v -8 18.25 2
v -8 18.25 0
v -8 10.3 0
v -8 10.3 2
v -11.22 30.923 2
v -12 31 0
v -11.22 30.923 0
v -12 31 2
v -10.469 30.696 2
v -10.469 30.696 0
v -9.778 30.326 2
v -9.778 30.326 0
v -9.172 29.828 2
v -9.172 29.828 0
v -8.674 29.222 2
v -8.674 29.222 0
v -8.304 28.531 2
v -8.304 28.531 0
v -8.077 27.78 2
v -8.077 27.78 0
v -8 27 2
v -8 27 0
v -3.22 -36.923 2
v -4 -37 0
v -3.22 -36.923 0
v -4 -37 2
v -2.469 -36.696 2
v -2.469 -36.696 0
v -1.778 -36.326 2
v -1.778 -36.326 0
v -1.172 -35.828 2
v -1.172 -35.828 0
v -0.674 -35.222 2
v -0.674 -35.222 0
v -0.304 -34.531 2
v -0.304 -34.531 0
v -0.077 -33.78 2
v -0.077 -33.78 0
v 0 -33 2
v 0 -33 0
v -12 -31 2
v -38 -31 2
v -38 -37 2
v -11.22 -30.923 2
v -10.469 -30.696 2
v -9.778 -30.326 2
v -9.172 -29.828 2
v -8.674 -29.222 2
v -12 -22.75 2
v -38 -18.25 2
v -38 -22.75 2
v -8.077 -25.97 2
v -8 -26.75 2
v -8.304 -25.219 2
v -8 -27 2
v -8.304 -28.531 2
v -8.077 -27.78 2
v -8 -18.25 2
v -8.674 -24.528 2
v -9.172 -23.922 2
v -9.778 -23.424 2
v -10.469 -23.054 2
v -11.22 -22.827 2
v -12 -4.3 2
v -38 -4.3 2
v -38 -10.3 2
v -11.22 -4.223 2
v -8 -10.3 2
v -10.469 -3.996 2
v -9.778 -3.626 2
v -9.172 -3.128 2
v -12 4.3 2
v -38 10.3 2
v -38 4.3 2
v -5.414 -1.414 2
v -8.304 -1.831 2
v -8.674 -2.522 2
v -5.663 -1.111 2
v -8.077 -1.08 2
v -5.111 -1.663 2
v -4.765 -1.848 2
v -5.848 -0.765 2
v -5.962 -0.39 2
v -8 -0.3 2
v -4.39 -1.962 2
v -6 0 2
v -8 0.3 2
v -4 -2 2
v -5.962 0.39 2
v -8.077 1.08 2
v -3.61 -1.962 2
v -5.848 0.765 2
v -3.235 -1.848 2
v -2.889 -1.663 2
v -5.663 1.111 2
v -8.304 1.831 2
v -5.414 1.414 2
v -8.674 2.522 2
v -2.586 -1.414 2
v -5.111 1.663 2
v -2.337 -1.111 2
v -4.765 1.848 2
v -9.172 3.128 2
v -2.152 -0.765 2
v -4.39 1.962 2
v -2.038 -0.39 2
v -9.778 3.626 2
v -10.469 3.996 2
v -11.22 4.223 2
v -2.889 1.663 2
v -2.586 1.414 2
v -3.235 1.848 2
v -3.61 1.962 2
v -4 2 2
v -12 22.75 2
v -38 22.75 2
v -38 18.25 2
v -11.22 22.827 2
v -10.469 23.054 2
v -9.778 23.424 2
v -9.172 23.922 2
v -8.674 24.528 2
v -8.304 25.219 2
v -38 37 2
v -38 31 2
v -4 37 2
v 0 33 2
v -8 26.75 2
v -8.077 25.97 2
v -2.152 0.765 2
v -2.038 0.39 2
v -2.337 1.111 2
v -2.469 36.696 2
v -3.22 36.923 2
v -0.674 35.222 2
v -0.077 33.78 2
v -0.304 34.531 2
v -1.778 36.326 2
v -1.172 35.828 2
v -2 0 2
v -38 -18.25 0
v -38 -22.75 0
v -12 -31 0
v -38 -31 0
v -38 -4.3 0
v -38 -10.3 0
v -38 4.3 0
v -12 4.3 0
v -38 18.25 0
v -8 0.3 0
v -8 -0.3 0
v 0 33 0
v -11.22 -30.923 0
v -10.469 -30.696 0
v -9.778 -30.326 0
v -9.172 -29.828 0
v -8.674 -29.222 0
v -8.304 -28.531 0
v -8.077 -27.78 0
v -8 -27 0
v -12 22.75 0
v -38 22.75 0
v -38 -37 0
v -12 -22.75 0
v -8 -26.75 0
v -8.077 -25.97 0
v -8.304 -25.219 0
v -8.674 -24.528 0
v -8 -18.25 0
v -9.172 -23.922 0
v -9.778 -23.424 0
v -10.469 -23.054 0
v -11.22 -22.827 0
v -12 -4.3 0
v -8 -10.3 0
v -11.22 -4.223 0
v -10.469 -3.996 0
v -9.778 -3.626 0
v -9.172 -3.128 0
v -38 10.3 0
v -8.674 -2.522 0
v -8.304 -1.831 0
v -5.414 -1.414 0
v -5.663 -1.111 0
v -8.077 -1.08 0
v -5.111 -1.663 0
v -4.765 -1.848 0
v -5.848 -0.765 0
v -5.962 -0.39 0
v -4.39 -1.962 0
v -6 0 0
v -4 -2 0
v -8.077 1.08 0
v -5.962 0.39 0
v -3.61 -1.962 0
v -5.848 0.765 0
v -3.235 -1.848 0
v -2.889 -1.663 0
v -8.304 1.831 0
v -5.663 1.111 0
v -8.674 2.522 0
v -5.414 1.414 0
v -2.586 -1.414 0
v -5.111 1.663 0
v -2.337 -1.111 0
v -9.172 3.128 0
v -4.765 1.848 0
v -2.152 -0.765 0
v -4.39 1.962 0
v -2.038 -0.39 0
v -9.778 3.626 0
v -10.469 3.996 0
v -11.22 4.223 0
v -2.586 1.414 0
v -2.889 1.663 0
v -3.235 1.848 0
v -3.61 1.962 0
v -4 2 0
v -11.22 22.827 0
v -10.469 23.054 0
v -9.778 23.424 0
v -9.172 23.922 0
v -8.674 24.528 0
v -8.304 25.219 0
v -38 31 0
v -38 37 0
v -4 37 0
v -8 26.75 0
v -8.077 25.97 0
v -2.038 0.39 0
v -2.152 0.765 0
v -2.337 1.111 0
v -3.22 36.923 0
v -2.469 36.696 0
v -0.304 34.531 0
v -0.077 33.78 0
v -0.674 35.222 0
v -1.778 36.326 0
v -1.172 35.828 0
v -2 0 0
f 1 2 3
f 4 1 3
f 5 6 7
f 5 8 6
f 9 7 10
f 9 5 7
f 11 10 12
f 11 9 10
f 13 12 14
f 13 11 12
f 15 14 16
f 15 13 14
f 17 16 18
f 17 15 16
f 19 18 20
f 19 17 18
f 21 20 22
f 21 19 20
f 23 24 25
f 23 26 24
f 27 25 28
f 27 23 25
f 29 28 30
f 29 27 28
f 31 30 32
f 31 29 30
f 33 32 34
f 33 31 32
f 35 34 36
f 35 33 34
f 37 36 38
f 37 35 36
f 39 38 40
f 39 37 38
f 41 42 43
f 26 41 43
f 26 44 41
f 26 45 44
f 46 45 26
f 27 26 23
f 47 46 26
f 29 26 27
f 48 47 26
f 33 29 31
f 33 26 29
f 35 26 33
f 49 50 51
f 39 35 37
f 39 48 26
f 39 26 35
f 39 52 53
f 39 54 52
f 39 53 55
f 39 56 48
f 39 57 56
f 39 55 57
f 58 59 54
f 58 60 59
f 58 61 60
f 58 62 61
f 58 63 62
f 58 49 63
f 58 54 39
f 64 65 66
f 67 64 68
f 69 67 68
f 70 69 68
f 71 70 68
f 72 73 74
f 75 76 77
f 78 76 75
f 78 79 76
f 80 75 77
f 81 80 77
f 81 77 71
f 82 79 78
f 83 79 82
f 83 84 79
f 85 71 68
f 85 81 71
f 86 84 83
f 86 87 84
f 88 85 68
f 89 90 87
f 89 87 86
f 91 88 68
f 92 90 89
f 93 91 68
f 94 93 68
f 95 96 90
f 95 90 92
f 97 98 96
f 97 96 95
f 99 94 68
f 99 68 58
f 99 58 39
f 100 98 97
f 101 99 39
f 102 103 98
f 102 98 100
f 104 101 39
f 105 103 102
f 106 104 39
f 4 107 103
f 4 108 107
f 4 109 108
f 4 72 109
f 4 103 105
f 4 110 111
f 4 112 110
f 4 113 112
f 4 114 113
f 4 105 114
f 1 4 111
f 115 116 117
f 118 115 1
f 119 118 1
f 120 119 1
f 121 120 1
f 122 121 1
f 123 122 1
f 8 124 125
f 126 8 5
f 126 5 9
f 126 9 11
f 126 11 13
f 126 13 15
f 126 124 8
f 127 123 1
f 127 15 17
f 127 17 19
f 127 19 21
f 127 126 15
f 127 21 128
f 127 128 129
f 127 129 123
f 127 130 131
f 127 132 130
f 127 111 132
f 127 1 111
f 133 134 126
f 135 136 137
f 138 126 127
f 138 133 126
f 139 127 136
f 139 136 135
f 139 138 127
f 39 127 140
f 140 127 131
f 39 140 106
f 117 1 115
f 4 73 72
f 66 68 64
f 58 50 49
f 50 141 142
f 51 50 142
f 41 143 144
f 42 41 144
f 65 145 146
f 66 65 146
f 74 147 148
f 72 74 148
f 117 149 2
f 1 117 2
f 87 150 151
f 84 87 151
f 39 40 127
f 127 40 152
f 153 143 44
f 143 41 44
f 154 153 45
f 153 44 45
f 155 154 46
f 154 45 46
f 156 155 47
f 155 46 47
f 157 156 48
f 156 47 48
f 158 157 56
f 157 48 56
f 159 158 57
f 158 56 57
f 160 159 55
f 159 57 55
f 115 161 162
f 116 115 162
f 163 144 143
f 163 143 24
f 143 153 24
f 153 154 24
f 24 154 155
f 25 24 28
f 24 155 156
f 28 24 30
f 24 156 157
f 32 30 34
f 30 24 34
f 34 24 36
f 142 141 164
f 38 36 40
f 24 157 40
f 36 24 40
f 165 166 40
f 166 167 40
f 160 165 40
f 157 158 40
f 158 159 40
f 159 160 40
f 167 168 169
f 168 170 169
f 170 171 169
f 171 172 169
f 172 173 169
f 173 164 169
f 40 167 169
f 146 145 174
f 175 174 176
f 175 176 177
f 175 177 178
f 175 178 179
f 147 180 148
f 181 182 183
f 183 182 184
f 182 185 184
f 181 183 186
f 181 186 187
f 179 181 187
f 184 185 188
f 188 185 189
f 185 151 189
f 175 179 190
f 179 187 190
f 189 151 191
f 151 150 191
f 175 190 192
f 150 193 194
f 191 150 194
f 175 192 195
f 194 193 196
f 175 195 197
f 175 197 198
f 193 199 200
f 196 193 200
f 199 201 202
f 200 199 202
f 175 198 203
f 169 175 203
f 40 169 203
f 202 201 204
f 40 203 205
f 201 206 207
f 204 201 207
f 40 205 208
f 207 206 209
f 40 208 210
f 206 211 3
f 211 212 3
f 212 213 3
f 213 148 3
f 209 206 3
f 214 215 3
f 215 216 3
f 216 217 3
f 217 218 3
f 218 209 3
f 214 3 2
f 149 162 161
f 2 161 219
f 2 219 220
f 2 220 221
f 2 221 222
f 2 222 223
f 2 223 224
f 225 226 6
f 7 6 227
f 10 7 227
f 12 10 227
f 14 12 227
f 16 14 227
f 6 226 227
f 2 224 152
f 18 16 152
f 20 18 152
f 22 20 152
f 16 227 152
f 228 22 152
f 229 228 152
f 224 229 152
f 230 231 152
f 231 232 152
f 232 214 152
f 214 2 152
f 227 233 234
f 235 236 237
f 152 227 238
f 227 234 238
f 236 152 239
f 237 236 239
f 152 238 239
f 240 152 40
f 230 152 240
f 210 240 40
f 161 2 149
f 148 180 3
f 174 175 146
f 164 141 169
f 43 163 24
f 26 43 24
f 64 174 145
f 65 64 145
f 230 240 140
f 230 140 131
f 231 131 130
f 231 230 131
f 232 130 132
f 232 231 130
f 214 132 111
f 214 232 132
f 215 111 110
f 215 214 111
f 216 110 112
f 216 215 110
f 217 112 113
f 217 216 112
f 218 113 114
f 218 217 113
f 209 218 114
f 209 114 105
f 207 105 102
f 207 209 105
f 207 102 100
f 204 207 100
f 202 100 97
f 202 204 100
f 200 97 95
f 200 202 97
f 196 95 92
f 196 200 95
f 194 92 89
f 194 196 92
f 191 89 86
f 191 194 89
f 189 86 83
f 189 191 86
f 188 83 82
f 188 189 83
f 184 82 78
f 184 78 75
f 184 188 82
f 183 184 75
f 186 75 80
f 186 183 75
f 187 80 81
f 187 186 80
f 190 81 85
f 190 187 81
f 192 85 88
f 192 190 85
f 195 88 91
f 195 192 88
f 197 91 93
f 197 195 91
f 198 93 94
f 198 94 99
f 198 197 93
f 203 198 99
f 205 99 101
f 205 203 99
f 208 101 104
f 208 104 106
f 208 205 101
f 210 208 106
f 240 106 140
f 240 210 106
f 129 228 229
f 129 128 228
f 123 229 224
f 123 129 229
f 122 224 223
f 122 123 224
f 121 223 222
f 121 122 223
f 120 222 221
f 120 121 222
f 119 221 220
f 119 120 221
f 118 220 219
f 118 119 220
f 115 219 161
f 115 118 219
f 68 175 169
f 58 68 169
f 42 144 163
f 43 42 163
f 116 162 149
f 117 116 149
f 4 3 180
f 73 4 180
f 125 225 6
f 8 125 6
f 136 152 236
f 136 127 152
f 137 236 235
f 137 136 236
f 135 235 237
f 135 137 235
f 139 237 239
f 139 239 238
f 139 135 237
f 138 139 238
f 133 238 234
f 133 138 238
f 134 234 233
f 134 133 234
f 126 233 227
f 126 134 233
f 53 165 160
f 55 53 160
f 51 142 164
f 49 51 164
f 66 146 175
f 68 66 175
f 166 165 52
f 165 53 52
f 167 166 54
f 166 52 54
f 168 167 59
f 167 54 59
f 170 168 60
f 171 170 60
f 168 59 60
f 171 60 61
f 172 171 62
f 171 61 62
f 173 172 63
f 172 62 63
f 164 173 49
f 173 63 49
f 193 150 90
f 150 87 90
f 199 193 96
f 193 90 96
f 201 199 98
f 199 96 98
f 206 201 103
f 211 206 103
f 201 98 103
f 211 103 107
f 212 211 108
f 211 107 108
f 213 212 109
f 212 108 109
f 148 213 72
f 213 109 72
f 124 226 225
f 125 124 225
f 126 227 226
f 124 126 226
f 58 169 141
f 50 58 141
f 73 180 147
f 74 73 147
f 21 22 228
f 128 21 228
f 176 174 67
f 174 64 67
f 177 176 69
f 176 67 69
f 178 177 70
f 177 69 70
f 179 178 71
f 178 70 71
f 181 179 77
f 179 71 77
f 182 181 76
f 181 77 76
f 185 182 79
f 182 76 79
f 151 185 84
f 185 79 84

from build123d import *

# Parameters (mm, degrees)
SKETCH_1_R      = 2
EXTRUDE_1_DEPTH = 2
FILLET_1_R      = 4


with BuildPart() as part:
    # ｽｹｯﾁ1 → ﾎﾞｽ - 押し出し1 (new body)
    with BuildSketch(Plane.XY):
        Polygon((-38, -31), (-38, -37), (0, -37), (0, 37), (-38, 37), (-38, 31), (-8, 31), (-8, 22.75), (-38, 22.75), (-38, 18.25), (-8, 18.25), (-8, 10.3), (-38, 10.3), (-38, 4.3), (-8, 4.3), (-8, -4.3), (-38, -4.3), (-38, -10.3), (-8, -10.3), (-8, -18.25), (-38, -18.25), (-38, -22.75), (-8, -22.75), (-8, -31), align=None)
        with Locations((-4, 0)):
            Circle(SKETCH_1_R, mode=Mode.SUBTRACT)
    extrude(amount=EXTRUDE_1_DEPTH)

    # ﾌｨﾚｯﾄ1
    fillet_1_edges = [part.edges().sort_by_distance(p)[0] for p in [
        (-8, -31, 1),
        (-8, -22.75, 1),
        (-8, -4.3, 1),
        (-8, 4.3, 1),
        (-8, 22.75, 1),
        (-8, 31, 1),
        (0, 37, 1),
        (0, -37, 1),
    ]]
    fillet(fillet_1_edges, radius=FILLET_1_R)


solid = part.part
